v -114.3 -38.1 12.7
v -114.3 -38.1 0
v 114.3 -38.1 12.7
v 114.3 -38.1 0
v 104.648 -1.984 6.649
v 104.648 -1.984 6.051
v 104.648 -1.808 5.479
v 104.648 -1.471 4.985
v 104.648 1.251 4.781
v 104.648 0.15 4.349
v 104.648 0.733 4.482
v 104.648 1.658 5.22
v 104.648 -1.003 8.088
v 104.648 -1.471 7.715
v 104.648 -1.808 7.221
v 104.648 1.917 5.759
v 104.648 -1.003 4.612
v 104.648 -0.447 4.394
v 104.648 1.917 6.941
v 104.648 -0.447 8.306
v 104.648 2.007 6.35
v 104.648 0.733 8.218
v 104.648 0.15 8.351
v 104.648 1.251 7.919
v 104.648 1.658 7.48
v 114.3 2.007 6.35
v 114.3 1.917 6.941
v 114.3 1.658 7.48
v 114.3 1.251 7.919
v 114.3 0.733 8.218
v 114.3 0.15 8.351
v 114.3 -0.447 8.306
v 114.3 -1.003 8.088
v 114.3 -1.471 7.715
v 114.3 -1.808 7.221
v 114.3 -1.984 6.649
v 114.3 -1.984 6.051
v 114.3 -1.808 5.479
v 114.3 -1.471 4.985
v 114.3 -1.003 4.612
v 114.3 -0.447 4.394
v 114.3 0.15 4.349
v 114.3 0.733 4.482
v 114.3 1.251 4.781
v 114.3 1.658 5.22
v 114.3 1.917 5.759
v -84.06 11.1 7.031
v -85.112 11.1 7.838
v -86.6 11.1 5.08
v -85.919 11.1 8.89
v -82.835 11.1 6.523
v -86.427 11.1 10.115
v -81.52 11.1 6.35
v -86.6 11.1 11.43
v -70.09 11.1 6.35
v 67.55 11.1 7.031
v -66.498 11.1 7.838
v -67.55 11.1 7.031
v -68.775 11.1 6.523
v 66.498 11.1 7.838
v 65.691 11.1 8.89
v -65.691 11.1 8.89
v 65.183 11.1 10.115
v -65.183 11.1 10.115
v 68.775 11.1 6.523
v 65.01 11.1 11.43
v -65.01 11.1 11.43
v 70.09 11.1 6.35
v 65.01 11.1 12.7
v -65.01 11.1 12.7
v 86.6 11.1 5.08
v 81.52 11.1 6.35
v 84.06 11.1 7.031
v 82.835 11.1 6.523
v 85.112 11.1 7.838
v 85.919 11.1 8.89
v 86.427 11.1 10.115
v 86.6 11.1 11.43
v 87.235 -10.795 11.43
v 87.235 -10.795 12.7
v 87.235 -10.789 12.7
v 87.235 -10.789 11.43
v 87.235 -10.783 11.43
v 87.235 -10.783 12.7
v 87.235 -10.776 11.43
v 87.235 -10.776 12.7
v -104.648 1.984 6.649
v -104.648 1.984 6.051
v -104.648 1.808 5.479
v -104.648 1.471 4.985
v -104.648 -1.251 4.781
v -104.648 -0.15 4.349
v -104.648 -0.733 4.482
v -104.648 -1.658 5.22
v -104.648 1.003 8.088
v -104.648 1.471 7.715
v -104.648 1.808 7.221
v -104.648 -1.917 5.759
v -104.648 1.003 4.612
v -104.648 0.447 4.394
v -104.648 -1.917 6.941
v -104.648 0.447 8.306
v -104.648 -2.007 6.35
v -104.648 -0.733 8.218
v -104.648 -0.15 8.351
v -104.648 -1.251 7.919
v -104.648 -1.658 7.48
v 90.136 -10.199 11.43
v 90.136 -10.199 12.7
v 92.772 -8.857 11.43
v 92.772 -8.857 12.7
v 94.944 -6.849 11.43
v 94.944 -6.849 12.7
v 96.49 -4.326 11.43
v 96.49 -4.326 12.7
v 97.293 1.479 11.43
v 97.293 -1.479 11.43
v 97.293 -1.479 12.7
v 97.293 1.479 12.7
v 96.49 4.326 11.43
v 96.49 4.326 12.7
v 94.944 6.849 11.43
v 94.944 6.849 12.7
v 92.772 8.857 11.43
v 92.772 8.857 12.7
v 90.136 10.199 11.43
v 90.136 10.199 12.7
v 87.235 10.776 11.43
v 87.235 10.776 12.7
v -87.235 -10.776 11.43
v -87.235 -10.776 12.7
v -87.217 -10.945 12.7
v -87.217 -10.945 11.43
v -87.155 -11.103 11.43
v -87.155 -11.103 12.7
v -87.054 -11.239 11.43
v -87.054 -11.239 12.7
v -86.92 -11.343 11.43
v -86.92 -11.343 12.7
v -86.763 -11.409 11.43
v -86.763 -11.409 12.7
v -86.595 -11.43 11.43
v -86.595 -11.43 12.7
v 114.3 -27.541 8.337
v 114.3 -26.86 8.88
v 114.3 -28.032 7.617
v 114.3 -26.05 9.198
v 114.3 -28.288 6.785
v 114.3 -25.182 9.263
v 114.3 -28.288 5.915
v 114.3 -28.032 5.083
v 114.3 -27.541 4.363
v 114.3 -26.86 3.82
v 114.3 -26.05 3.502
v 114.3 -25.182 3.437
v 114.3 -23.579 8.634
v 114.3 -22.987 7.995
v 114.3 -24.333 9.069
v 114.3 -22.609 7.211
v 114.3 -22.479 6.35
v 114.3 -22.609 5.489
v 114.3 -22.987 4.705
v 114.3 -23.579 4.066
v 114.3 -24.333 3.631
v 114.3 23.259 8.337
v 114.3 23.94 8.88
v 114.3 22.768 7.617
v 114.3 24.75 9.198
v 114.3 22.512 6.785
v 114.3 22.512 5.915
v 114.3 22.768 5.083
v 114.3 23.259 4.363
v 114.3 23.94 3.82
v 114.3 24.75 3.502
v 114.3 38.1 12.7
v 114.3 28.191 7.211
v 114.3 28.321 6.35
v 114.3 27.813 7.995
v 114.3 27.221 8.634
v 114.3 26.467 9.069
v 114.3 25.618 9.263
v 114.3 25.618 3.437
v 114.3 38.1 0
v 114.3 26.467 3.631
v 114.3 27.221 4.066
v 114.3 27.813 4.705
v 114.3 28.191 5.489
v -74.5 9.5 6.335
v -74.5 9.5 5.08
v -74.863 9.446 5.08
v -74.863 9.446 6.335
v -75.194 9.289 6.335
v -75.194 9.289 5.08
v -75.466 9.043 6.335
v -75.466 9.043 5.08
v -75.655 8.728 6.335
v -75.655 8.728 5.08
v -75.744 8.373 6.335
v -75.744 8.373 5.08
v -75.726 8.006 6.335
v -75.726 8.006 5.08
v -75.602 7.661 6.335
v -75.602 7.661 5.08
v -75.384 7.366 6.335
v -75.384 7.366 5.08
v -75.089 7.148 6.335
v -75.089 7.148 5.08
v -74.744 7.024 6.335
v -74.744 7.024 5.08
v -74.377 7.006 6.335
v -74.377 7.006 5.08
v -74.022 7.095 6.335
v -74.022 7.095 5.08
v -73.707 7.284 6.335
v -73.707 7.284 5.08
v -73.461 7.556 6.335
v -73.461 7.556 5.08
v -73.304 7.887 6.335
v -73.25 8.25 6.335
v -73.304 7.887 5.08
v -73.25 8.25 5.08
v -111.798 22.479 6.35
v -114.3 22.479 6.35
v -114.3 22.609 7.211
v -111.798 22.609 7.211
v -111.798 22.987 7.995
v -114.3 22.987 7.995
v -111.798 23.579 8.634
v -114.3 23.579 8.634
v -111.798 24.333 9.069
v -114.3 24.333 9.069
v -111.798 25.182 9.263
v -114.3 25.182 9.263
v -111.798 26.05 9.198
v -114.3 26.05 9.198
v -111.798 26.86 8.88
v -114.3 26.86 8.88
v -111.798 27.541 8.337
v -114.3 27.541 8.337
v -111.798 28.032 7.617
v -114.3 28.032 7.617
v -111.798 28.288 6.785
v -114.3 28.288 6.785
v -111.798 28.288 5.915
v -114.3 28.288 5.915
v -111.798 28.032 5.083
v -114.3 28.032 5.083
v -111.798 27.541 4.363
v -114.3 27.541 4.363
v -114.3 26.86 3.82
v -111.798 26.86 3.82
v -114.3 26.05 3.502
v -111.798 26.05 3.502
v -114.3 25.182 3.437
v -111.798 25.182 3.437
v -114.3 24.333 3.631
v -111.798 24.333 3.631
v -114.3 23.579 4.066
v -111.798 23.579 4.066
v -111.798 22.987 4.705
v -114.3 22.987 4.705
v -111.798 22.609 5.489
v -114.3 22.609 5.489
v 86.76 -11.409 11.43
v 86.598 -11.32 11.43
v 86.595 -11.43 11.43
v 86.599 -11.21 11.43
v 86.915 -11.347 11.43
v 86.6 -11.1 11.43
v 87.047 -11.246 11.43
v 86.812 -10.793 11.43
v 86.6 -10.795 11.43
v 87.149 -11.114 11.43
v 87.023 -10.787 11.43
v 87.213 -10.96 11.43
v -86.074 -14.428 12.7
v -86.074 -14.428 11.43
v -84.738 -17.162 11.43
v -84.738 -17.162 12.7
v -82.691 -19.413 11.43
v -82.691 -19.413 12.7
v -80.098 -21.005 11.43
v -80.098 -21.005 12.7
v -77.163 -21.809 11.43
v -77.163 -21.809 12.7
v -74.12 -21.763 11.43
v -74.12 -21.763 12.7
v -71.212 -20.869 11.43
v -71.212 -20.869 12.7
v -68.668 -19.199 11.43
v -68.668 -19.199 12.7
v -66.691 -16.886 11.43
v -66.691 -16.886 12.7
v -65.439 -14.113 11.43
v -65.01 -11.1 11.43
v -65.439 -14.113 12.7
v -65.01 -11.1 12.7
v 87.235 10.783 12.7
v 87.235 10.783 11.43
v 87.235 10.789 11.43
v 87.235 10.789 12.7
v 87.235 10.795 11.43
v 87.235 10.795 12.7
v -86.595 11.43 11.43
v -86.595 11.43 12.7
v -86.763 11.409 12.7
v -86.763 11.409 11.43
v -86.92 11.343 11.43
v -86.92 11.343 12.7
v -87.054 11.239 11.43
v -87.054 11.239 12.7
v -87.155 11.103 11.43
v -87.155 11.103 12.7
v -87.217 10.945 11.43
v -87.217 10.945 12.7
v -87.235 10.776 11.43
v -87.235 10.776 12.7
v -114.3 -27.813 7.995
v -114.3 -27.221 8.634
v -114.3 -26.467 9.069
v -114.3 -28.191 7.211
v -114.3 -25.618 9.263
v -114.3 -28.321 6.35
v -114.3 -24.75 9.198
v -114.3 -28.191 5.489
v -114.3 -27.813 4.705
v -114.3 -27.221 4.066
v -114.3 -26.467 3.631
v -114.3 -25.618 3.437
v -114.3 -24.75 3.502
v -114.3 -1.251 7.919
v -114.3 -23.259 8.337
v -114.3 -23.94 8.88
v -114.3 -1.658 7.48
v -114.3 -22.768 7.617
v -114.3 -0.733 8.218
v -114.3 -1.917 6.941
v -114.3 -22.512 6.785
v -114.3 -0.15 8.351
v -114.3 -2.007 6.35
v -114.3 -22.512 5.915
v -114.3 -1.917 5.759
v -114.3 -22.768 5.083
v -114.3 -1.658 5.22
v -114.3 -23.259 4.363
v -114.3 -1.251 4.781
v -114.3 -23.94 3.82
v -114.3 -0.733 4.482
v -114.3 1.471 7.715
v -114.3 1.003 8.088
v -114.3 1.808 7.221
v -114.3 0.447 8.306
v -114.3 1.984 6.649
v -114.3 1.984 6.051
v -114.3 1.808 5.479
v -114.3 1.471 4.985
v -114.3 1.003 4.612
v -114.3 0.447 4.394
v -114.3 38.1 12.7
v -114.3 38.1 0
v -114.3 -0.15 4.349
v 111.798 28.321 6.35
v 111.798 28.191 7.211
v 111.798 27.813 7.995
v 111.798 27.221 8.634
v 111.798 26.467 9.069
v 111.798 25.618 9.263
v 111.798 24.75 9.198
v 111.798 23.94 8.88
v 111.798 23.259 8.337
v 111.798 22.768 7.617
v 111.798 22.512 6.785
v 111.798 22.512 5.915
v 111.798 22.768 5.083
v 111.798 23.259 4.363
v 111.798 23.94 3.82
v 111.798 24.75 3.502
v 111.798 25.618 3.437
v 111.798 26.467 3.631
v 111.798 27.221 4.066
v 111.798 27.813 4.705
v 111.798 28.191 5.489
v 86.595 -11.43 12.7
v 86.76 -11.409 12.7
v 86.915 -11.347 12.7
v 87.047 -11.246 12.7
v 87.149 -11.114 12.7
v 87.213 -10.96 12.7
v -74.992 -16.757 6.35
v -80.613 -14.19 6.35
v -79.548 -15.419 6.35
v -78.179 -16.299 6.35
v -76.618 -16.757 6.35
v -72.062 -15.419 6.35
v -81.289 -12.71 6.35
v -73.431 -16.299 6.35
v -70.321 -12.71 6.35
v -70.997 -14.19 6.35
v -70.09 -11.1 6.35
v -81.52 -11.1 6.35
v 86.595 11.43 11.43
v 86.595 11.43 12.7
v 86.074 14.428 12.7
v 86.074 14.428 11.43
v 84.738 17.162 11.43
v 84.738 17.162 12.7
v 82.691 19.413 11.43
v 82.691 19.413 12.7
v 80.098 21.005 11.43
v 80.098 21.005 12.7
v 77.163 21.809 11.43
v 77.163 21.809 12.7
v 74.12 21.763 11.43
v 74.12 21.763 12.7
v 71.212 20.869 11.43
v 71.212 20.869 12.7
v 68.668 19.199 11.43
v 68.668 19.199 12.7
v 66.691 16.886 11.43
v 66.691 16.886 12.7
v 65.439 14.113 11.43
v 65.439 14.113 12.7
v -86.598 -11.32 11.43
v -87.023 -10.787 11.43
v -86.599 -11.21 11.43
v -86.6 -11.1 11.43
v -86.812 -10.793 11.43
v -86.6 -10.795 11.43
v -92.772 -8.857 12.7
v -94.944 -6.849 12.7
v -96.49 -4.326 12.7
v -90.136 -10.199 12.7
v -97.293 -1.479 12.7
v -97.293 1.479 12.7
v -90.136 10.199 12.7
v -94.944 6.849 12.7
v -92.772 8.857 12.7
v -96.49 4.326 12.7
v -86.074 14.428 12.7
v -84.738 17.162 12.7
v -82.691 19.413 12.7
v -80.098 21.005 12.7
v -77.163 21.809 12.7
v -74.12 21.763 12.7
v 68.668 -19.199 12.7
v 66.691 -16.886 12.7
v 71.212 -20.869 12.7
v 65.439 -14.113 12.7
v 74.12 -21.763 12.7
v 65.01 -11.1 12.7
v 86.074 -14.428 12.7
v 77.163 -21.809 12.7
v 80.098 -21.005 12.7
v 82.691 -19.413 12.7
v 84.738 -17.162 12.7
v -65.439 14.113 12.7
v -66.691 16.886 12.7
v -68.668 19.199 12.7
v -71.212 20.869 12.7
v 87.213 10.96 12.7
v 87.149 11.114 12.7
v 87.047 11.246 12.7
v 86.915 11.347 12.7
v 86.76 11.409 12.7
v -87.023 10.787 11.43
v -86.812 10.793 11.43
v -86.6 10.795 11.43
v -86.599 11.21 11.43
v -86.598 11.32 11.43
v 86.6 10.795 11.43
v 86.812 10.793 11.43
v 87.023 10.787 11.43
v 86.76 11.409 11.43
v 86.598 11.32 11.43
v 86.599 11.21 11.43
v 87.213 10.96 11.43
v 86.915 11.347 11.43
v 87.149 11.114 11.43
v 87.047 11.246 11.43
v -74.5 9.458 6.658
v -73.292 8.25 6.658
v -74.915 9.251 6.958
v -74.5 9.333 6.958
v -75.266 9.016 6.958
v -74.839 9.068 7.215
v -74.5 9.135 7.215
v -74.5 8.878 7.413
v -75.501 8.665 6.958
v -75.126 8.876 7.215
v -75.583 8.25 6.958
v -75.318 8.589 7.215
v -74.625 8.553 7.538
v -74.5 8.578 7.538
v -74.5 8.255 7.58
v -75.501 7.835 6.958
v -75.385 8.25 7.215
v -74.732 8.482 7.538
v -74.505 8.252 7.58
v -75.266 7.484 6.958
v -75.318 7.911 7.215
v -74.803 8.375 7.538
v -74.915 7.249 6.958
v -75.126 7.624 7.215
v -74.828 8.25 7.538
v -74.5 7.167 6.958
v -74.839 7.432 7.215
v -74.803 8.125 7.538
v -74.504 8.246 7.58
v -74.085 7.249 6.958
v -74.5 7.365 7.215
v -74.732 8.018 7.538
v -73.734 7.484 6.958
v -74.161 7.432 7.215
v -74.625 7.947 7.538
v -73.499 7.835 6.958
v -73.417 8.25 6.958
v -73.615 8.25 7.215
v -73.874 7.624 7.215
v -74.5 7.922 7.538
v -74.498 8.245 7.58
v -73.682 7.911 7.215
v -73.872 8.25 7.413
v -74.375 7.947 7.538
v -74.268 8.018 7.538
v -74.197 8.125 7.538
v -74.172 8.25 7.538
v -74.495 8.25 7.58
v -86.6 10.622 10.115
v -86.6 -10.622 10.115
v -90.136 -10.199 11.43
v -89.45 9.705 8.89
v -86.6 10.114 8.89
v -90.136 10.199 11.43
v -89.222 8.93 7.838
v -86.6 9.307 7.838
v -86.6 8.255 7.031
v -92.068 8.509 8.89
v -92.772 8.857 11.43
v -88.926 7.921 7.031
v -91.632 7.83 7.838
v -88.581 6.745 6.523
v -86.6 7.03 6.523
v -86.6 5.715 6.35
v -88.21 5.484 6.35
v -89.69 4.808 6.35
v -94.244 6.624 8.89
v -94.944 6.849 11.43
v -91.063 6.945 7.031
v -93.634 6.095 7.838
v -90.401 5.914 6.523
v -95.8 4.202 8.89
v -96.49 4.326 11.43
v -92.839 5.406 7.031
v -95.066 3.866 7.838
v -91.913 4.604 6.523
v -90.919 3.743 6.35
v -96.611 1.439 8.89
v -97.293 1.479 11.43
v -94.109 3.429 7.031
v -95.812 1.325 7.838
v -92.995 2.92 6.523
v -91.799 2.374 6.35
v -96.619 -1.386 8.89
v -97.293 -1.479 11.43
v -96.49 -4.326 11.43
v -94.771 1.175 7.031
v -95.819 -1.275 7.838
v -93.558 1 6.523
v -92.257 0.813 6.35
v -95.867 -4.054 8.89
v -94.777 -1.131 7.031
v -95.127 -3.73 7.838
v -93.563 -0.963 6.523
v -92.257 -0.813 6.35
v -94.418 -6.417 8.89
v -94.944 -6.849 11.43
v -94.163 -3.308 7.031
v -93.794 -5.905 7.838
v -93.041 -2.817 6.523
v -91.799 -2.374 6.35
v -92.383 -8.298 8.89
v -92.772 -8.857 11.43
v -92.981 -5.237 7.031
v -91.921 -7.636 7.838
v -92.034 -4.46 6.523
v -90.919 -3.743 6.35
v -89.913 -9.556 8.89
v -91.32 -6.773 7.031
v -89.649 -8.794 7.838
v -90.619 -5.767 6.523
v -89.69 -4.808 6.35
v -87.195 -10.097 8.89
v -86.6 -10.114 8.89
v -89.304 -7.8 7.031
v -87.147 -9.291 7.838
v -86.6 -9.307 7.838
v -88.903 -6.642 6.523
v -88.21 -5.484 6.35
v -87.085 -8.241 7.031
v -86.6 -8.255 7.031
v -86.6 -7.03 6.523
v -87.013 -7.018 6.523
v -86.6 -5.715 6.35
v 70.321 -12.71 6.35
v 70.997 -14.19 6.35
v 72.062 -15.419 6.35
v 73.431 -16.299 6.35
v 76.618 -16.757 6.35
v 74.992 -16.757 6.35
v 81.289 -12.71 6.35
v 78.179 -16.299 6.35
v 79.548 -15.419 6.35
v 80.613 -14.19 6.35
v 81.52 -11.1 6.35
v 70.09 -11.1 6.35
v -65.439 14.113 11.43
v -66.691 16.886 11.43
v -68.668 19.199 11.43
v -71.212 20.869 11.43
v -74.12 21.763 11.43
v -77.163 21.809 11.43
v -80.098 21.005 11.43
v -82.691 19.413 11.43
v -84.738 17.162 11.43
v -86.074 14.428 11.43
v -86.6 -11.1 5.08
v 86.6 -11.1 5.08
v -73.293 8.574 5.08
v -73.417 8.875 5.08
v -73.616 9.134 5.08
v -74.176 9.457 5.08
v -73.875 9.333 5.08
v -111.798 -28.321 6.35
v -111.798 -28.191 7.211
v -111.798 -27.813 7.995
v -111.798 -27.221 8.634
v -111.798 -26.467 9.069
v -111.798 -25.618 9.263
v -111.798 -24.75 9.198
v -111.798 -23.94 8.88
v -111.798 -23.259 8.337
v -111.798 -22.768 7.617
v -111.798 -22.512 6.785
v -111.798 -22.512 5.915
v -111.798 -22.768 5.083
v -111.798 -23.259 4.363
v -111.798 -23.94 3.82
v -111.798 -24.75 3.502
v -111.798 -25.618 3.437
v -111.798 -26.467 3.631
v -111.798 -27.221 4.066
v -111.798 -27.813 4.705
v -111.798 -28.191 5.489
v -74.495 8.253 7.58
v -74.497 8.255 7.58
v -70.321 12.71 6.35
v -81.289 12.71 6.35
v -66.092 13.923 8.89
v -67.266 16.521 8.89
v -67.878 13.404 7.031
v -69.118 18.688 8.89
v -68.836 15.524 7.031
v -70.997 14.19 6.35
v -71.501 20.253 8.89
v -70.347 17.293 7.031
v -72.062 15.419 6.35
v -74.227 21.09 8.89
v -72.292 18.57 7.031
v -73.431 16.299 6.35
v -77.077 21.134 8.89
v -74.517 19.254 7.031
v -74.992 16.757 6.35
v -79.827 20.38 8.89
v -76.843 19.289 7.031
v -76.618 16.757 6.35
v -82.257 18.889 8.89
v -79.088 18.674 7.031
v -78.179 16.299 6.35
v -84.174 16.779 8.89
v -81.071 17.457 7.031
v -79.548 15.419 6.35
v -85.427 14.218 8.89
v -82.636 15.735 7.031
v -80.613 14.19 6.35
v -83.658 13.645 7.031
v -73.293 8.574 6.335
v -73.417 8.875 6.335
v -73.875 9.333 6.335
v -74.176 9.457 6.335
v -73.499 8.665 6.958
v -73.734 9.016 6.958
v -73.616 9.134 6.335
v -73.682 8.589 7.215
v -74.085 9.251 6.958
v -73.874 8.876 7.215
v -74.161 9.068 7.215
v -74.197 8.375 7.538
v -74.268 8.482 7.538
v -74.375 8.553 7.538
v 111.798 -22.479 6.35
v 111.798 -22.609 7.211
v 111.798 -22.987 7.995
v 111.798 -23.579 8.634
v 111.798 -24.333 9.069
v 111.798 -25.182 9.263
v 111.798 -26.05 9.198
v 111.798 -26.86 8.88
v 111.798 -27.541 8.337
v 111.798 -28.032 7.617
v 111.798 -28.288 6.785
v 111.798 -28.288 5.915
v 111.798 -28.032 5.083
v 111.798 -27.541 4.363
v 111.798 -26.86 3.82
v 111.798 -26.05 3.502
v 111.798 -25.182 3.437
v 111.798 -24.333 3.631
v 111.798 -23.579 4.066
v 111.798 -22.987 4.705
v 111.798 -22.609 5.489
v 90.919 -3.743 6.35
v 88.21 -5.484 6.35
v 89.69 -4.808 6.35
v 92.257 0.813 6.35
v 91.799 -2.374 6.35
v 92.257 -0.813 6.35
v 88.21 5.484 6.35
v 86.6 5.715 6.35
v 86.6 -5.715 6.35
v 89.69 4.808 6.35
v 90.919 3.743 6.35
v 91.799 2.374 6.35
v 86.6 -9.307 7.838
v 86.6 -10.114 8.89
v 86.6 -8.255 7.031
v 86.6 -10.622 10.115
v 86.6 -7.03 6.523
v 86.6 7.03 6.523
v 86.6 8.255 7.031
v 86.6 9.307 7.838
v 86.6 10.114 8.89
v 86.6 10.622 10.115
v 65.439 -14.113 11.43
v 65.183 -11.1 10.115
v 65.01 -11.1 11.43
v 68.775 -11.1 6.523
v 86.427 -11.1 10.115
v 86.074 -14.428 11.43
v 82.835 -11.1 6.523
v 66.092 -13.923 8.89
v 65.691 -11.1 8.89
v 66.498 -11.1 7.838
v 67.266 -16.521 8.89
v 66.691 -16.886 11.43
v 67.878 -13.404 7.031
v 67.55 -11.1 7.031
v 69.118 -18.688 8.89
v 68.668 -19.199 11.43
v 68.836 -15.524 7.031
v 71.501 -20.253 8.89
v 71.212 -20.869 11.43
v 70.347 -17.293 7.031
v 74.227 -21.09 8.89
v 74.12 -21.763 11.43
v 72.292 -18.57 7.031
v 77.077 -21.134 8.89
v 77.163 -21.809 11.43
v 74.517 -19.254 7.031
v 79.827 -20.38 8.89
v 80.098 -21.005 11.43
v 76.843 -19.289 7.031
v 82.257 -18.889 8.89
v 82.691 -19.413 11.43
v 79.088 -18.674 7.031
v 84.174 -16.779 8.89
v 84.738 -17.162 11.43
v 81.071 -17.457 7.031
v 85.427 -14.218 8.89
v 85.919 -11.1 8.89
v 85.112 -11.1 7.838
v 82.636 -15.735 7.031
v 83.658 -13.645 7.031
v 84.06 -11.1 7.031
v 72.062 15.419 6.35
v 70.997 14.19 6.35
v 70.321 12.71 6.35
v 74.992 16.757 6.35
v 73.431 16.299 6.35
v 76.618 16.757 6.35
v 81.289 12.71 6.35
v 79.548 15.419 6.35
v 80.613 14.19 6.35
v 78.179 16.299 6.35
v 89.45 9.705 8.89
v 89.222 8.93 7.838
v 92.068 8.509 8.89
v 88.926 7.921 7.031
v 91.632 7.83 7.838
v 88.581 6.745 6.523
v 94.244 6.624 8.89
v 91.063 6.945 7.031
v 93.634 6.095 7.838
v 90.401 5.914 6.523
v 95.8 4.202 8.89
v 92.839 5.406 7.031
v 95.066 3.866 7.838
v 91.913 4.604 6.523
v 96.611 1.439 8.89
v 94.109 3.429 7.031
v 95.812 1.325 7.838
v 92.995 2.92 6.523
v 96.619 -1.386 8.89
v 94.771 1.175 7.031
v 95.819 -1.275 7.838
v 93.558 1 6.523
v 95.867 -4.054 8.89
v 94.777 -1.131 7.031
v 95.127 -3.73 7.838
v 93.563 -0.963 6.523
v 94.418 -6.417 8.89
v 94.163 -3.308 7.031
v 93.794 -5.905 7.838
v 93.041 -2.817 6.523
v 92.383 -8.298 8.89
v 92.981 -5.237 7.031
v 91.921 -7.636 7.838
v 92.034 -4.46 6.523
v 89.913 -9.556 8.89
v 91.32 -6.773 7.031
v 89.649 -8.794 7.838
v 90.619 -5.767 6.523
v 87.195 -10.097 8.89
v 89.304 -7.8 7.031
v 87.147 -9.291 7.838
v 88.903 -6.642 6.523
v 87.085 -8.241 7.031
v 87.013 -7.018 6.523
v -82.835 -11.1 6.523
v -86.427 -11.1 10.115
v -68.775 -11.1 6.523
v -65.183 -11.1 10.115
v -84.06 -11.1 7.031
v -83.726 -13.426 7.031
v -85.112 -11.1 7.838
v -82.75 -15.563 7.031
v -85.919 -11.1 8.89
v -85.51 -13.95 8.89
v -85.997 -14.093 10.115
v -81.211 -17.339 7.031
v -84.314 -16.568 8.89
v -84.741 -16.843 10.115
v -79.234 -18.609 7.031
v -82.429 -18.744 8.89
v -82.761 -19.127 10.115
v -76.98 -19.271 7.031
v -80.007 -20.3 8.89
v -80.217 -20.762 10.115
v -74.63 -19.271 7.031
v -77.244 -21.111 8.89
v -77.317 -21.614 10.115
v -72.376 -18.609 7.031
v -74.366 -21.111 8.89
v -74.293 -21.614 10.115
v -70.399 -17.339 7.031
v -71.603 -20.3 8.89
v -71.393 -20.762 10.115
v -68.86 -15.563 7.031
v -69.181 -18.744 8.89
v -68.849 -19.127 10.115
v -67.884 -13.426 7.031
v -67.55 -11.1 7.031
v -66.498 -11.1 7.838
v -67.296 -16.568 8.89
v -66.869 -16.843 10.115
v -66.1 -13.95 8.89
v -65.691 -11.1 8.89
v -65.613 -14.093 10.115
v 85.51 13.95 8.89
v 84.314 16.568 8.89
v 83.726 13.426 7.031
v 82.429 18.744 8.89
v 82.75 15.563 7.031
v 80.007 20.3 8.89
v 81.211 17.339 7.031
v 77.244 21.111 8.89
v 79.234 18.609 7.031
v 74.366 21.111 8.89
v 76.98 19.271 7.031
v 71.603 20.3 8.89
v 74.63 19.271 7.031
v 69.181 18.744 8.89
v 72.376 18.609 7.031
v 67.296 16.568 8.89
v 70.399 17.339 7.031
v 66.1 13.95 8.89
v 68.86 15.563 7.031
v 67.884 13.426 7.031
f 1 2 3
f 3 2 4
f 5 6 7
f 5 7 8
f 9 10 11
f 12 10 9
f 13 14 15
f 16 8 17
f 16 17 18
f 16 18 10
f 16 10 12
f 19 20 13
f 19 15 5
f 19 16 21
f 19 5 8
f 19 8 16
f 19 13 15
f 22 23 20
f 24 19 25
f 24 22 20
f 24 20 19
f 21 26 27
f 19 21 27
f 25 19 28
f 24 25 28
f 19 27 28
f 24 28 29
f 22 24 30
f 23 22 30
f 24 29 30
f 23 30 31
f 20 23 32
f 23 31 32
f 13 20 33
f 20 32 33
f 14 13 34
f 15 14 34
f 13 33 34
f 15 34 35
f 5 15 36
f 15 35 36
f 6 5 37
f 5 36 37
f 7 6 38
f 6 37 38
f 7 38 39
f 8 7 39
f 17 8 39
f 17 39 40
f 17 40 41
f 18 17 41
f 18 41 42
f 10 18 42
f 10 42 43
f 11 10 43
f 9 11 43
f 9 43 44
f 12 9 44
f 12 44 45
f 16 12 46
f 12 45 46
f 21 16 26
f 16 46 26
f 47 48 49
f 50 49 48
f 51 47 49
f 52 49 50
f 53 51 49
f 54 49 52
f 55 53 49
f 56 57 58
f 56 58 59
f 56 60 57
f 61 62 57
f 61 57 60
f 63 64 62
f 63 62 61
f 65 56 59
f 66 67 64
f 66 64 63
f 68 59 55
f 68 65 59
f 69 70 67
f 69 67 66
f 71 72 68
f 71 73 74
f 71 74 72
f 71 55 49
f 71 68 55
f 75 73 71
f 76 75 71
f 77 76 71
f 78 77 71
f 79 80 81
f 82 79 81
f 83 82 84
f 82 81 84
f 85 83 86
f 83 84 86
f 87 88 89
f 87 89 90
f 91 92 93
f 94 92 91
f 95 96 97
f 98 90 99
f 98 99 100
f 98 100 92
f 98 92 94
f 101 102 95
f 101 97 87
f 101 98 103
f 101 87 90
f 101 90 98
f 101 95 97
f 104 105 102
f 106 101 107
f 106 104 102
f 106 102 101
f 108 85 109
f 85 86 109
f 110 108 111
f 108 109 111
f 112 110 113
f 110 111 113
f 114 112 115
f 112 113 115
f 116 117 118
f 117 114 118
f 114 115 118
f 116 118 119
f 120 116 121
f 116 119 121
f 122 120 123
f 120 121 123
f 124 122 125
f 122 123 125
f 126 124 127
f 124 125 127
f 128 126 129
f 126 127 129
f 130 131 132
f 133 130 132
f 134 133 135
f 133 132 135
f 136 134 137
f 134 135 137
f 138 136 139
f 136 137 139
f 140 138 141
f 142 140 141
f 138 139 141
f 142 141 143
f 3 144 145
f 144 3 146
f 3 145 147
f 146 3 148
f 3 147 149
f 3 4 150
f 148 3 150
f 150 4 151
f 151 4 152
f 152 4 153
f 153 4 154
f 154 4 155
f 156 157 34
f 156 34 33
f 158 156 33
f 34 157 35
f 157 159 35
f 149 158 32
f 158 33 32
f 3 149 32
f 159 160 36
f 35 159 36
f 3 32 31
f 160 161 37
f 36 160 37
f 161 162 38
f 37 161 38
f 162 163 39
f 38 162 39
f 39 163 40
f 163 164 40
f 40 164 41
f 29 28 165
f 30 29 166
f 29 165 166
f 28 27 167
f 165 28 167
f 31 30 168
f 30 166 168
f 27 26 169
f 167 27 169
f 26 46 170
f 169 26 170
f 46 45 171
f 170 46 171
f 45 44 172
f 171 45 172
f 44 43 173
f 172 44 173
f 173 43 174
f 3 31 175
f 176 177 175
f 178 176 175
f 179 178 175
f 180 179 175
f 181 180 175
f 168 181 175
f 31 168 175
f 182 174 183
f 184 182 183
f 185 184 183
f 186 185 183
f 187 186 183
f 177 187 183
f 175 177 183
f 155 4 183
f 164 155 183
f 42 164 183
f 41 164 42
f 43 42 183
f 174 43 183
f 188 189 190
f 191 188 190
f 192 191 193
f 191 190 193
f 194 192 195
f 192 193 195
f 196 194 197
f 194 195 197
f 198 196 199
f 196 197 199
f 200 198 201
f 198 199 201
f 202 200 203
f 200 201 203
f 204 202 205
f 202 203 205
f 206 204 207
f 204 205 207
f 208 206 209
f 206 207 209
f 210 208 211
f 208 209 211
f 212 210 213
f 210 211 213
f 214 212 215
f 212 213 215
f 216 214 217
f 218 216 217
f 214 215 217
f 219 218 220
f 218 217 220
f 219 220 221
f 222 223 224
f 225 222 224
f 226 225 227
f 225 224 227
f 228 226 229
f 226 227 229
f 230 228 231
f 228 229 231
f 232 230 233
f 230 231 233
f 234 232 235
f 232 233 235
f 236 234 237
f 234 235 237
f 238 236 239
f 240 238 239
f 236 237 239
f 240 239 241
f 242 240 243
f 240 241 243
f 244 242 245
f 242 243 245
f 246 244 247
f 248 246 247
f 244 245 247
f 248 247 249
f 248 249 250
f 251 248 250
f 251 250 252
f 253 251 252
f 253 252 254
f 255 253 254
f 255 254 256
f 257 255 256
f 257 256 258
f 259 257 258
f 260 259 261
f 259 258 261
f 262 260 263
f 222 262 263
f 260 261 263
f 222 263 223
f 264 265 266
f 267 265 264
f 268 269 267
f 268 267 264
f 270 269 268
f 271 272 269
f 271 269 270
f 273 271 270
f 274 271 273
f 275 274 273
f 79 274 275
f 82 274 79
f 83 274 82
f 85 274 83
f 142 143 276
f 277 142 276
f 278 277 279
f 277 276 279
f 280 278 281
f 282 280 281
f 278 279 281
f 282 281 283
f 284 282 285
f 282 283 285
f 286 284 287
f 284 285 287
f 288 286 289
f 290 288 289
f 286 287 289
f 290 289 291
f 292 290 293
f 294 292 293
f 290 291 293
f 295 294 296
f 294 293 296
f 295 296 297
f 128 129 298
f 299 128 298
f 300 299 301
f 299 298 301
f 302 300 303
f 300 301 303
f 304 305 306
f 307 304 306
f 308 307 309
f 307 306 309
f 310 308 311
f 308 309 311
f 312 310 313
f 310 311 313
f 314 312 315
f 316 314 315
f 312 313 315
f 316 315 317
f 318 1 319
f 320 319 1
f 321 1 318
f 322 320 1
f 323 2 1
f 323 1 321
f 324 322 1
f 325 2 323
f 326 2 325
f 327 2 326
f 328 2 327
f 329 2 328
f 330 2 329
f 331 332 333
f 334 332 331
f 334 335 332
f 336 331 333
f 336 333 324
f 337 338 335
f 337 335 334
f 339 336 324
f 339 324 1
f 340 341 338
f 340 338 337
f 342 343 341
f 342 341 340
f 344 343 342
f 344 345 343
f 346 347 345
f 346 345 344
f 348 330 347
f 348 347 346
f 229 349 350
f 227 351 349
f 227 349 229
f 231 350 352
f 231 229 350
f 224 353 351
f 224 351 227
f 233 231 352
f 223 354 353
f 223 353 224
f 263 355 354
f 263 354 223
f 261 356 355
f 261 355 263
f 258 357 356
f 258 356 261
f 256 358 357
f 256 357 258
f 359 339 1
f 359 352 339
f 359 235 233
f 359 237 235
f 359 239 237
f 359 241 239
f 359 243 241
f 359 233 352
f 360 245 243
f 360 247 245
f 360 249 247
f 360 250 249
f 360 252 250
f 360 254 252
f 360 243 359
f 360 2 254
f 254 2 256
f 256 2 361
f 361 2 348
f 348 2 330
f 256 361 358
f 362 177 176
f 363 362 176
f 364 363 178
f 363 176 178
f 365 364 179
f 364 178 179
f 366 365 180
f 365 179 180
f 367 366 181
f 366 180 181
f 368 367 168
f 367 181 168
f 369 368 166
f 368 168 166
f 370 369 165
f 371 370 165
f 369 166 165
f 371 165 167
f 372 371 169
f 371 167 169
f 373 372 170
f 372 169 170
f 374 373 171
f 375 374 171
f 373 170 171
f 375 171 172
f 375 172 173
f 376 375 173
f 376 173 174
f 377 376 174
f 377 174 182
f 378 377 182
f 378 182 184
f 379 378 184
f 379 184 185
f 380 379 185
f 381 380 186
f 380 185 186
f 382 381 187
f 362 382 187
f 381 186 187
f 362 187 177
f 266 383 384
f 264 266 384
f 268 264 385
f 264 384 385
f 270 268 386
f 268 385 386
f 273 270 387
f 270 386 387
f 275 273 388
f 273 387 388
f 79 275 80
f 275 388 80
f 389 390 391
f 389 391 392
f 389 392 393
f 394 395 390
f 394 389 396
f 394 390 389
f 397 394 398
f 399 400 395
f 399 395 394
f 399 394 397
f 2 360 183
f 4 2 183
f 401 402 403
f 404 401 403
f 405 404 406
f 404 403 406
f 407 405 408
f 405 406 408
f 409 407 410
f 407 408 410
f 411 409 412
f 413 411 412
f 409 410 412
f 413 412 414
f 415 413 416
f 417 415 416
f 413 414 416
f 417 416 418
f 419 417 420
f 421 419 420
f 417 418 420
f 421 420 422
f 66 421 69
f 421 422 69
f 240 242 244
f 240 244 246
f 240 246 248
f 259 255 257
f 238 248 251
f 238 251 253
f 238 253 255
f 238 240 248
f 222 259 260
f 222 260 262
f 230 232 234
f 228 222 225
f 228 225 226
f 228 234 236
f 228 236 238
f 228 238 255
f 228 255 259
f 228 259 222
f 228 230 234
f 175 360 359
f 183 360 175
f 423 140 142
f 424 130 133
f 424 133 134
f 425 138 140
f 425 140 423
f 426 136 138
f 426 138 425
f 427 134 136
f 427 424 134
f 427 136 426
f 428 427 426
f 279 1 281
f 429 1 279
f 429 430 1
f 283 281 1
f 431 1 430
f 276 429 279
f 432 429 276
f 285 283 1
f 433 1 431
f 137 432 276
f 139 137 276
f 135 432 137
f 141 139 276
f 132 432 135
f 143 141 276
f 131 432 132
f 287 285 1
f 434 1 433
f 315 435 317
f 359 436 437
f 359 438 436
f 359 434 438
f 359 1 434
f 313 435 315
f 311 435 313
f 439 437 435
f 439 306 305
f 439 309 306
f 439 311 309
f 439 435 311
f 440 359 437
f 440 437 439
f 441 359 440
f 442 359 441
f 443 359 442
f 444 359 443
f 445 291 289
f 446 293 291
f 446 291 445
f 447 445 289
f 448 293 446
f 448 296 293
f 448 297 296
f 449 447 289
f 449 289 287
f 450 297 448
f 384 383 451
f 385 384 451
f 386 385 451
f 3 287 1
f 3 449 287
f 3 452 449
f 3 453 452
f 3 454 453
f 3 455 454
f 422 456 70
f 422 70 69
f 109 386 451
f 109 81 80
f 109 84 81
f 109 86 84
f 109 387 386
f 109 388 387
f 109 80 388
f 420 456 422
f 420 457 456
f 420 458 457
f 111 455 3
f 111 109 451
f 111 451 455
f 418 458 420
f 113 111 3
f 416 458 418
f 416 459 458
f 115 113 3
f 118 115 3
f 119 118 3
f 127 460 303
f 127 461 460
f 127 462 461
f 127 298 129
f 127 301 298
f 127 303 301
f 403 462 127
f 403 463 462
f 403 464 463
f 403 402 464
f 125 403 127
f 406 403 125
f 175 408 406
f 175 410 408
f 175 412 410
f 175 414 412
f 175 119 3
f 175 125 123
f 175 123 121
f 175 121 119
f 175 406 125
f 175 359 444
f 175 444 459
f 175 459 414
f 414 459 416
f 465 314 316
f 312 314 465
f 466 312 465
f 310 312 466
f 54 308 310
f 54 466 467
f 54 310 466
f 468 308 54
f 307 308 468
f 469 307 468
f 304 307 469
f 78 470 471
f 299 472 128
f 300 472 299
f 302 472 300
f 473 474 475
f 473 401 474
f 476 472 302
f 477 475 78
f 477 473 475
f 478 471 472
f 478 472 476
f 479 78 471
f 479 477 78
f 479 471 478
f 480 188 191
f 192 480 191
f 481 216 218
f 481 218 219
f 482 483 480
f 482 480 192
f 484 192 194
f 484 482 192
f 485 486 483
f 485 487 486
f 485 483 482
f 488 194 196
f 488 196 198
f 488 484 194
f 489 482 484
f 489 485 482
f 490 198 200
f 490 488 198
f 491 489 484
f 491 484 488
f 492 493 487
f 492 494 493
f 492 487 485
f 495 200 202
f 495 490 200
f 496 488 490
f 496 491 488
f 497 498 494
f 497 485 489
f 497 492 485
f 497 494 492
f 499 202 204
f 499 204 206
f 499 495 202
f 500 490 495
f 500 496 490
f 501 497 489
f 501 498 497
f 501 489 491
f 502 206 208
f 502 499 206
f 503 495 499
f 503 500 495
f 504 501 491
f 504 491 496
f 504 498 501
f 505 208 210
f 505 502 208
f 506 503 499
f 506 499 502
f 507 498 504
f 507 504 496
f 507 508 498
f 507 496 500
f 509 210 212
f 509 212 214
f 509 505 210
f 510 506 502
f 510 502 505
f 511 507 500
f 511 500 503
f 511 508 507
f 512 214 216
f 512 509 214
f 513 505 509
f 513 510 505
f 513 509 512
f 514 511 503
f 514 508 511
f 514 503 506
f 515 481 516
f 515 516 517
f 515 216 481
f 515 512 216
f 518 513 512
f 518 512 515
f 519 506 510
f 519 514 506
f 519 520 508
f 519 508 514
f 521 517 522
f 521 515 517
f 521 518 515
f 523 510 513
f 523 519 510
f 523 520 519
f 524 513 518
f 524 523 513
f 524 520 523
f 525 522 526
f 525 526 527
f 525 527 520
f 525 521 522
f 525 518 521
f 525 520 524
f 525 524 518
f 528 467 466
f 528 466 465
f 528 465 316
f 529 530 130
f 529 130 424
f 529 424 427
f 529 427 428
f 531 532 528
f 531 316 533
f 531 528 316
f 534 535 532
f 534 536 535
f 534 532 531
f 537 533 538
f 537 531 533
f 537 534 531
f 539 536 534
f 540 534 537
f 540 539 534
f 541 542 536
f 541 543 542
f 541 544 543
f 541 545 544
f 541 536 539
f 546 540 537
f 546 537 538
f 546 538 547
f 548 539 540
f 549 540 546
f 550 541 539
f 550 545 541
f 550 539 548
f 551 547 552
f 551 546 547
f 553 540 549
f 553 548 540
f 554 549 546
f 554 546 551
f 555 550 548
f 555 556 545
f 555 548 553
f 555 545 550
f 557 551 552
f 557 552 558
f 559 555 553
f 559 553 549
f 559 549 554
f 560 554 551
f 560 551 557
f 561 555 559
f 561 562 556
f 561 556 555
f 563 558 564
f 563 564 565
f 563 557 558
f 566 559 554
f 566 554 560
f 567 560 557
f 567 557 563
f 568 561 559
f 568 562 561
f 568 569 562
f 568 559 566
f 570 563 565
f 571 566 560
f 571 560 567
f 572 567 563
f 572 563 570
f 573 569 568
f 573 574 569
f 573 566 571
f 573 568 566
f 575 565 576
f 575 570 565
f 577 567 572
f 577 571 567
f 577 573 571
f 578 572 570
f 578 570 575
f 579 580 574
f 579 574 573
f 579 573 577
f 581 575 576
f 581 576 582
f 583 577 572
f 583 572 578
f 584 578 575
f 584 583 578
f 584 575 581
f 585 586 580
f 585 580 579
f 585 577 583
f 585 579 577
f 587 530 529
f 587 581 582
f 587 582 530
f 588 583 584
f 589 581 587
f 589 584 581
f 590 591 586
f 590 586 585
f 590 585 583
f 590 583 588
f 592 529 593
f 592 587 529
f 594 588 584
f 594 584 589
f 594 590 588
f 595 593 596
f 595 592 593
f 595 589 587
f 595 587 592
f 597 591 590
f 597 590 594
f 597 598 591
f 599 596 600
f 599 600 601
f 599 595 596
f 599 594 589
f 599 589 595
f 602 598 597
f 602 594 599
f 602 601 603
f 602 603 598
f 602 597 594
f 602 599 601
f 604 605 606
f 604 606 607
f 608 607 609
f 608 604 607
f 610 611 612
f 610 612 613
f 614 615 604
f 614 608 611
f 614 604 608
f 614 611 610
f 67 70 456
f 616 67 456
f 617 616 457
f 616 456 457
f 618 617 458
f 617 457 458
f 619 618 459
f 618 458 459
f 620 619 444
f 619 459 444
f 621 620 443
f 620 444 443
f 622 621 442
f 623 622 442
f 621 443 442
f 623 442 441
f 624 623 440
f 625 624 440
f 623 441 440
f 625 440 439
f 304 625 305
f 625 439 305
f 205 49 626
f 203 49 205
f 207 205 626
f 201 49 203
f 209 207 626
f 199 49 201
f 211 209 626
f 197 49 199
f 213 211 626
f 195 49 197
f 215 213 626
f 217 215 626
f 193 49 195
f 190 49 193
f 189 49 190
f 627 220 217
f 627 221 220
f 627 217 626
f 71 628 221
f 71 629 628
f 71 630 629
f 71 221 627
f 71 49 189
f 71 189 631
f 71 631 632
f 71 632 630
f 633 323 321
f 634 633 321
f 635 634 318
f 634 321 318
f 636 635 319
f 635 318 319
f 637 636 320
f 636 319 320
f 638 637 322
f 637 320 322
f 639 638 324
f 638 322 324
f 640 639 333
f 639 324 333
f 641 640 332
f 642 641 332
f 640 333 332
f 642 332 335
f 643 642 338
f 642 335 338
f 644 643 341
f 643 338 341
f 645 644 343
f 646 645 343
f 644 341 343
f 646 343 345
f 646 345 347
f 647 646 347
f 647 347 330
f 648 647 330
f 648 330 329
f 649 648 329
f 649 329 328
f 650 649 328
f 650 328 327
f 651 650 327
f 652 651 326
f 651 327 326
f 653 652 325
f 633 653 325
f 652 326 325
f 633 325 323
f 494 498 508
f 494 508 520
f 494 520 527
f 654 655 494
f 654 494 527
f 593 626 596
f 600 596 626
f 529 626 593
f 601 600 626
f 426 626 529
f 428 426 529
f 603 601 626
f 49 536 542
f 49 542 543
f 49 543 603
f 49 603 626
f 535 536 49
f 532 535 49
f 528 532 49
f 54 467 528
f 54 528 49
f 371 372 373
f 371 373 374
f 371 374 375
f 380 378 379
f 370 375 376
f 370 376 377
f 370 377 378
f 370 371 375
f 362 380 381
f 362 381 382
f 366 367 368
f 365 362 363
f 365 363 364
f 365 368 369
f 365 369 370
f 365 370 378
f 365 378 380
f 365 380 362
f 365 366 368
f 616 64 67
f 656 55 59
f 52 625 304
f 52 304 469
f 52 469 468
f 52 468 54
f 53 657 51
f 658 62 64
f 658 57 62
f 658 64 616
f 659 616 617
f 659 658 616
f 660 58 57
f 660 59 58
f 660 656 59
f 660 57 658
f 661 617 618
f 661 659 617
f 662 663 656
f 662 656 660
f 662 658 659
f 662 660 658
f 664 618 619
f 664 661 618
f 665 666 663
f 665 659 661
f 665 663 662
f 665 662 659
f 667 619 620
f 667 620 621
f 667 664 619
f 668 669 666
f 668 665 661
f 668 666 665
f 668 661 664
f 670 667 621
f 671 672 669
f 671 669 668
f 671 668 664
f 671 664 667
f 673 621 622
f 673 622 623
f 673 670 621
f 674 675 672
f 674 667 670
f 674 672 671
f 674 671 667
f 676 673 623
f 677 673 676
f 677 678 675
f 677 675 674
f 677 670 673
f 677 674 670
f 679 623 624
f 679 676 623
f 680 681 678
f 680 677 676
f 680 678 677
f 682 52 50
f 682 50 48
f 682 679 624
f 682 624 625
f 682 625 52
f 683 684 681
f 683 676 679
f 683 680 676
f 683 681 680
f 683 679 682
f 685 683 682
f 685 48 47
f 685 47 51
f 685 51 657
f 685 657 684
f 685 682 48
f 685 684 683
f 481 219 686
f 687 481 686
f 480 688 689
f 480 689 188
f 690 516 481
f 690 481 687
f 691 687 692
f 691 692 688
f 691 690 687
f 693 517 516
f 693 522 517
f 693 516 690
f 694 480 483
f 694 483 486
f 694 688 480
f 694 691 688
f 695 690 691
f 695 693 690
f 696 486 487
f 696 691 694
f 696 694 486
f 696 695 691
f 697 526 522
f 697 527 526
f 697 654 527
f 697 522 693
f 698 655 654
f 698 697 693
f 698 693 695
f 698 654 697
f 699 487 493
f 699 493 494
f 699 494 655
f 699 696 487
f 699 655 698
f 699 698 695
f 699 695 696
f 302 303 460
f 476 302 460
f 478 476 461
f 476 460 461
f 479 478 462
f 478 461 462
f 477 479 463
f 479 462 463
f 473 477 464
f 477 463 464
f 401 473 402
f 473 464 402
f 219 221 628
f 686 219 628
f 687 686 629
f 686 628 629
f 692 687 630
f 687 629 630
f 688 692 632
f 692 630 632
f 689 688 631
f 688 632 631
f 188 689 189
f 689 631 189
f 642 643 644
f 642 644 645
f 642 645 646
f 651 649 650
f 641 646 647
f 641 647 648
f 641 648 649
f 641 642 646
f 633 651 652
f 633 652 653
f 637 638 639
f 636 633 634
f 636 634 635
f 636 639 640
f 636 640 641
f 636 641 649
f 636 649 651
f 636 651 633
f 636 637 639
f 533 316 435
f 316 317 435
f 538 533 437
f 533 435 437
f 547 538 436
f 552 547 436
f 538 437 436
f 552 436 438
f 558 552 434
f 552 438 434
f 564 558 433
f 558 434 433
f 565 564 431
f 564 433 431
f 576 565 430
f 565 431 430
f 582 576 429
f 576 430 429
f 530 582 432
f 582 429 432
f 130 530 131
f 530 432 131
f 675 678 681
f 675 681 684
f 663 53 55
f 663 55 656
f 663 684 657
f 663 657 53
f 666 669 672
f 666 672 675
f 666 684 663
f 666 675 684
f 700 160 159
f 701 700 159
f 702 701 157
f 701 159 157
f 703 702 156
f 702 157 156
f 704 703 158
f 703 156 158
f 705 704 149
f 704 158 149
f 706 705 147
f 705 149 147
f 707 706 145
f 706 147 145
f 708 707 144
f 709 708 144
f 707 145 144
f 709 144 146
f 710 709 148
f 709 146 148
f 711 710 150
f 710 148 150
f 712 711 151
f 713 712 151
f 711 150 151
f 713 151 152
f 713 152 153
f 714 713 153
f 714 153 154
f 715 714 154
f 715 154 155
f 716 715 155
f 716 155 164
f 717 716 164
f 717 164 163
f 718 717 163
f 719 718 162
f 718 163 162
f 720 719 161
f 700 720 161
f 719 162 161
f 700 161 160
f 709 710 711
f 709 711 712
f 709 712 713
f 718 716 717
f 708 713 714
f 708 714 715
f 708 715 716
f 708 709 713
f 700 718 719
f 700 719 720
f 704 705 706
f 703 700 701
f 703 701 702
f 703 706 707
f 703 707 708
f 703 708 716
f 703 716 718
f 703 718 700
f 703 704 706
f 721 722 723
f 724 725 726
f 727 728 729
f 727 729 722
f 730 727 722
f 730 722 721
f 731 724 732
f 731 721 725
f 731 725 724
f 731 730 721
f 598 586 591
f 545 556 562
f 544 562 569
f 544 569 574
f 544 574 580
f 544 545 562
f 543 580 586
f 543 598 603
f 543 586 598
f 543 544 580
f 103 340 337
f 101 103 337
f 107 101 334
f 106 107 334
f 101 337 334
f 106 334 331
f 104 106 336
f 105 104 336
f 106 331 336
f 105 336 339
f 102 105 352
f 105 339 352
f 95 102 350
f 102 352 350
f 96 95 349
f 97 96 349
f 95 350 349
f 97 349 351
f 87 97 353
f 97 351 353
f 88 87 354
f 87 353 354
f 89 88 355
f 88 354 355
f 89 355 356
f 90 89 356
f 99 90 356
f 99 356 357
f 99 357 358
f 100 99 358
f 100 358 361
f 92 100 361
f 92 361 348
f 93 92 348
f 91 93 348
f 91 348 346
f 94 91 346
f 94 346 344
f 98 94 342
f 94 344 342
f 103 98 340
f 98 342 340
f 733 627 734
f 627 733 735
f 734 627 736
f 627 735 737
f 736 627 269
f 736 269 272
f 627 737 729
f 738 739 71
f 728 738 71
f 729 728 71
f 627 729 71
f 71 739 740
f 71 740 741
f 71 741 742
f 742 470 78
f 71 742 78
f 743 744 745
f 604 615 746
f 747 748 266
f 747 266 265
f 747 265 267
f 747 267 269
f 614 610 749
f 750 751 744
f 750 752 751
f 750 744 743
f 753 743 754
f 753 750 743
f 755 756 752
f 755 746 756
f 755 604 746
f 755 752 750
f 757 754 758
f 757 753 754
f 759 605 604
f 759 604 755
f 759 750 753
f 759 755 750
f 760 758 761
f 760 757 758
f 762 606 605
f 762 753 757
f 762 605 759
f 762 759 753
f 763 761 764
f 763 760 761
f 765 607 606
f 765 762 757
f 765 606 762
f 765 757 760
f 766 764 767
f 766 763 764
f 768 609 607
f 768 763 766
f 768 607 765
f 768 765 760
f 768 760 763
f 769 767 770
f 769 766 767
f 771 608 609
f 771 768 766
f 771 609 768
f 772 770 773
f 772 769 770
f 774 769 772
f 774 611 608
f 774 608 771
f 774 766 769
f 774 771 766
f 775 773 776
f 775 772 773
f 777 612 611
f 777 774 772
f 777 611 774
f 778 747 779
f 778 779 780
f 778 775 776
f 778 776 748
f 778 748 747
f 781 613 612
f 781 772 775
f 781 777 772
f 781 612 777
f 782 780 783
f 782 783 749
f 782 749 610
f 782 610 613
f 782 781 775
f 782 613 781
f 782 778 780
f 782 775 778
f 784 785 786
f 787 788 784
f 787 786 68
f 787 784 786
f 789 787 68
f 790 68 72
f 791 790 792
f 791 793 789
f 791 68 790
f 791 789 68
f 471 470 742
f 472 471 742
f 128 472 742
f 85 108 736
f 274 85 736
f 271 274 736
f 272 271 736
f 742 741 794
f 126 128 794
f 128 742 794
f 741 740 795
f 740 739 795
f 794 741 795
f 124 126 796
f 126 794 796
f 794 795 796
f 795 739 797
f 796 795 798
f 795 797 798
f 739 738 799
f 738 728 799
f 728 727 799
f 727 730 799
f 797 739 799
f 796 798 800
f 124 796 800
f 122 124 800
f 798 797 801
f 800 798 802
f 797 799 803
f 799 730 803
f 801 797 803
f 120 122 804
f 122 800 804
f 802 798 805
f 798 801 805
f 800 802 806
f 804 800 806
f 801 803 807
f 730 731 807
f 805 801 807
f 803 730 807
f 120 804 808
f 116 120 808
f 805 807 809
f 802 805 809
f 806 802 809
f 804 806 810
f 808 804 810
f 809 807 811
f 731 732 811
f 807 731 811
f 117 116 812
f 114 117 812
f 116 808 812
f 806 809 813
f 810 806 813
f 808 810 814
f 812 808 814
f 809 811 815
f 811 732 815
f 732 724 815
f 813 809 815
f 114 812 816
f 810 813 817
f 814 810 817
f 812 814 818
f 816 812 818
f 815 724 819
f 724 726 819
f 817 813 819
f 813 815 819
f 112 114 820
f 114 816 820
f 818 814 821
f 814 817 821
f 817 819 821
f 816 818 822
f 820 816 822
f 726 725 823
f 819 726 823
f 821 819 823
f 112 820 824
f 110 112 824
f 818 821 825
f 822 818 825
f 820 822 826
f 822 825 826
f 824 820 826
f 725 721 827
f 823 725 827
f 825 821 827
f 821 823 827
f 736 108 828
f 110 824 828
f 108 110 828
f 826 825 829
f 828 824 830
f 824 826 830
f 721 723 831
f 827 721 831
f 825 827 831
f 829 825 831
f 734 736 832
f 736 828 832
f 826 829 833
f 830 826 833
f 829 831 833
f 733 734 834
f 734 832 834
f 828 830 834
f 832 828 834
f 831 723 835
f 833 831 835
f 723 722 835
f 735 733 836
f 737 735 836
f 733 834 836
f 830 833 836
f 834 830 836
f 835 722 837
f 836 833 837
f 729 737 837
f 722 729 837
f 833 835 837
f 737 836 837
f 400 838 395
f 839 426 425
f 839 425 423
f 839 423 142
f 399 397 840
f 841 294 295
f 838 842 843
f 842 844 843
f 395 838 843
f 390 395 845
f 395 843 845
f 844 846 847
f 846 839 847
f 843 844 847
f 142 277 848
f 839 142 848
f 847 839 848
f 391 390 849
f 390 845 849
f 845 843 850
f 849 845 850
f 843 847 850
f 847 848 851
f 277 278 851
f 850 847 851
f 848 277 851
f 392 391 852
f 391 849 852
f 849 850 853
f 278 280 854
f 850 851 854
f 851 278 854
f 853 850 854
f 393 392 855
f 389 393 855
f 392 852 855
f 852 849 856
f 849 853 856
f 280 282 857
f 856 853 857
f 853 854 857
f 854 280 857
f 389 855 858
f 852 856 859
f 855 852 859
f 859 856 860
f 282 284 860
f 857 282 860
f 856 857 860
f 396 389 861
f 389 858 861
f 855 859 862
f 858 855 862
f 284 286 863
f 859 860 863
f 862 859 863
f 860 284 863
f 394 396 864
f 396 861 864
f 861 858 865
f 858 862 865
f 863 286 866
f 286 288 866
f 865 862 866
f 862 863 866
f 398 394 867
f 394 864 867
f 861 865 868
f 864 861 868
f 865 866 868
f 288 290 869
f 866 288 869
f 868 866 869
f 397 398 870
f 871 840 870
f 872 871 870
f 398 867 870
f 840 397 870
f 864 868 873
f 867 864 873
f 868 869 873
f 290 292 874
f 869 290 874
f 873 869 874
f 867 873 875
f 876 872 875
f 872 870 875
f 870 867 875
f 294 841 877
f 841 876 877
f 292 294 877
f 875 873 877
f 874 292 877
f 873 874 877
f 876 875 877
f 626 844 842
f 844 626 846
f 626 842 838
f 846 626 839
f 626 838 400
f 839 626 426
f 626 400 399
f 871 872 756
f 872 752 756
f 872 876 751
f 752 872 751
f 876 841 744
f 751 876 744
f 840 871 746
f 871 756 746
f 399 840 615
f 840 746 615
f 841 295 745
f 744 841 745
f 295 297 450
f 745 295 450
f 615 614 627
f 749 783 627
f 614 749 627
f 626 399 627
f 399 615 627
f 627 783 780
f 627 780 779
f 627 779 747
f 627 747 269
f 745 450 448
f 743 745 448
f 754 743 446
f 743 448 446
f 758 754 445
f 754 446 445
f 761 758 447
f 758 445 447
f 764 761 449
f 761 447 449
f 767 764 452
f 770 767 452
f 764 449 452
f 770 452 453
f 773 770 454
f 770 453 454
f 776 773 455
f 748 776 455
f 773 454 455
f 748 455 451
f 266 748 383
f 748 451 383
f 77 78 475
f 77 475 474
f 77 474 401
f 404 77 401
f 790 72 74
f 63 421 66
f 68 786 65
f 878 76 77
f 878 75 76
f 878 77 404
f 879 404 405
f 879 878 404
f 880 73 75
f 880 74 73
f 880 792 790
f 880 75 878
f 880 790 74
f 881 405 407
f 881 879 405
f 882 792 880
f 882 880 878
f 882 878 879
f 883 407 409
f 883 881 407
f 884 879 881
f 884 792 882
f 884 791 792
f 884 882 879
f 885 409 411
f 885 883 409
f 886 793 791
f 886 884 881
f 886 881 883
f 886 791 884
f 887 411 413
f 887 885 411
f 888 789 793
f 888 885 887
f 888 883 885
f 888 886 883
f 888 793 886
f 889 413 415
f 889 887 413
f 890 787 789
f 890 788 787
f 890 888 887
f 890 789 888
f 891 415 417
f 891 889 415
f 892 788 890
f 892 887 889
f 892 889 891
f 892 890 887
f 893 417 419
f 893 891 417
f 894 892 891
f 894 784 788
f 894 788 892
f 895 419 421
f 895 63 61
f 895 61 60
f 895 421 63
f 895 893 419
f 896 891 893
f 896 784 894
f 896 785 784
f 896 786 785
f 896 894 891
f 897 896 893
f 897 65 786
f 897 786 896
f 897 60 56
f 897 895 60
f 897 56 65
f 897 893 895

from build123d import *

# Parameters (mm, degrees)
F0_W      = 228.6
F0_H      = 76.2
F1_DEPTH  = 12.7
F2_W      = 173.19999904
F2_H      = 22.19999878
F3_DEPTH  = 7.62
F4_R      = 10.795
F5_DEPTH  = 6.35
F7_DEPTH  = 6.35
F8_R      = 2.0066
F9_DEPTH  = 9.652
F10_R     = 2.0066
F11_DEPTH = 9.652
F12_R     = 2.921
F13_DEPTH = 2.5019
F14_R     = 2.921
F15_DEPTH = 2.5019
F16_R     = 5.08
F18_DEPTH = 2.50000008
F19_R     = 1.2446
F21_DEPTH = 1.27


with BuildPart() as f1:
    # F0 (on Top) → F1 (new body)
    with BuildSketch(Plane.XY):
        Rectangle(F0_W, F0_H)
    extrude(amount=F1_DEPTH)

    # F2 (on face) → F3 (cut)
    with BuildSketch(Plane.XY.offset(12.7)):
        Rectangle(F2_W, F2_H)
    extrude(amount=-F3_DEPTH, mode=Mode.SUBTRACT)

    # F4 (on face) → F5 (cut)
    with BuildSketch(Plane.XY.offset(12.7)):
        with Locations((-86.59999952, 0)):
            Circle(F4_R)
        with Locations((86.59999952, 0)):
            Circle(F4_R)
    extrude(amount=-F5_DEPTH, mode=Mode.SUBTRACT)

    # F6 (on face) → F7 (cut)
    with BuildSketch(Plane.XY.offset(12.7)):
        with BuildLine():
            Line((-75.80499952, -11.09999939), (-86.59999952, -11.09999939))
            ThreePointArc((-86.59999952, -11.09999939), (-75.80499952, -21.89499939), (-65.00999952, -11.09999939))
            Line((-65.00999952, -11.09999939), (-75.80499952, -11.09999939))
        make_face()
        with BuildLine():
            ThreePointArc((86.59999952, 11.09999939), (75.80499952, 21.89499939), (65.00999952, 11.09999939))
            Line((65.00999952, 11.09999939), (75.80499952, 11.09999939))
            Line((75.80499952, 11.09999939), (86.59999952, 11.09999939))
        make_face()
        with BuildLine():
            Line((75.80499952, -11.09999939), (65.00999952, -11.09999939))
            ThreePointArc((65.00999952, -11.09999939), (75.80499952, -21.89499939), (86.59999952, -11.09999939))
            Line((86.59999952, -11.09999939), (75.80499952, -11.09999939))
        make_face()
        with BuildLine():
            ThreePointArc((-65.00999952, 11.09999939), (-75.80499952, 21.89499939), (-86.59999952, 11.09999939))
            Line((-86.59999952, 11.09999939), (-75.80499952, 11.09999939))
            Line((-75.80499952, 11.09999939), (-65.00999952, 11.09999939))
        make_face()
    extrude(amount=-F7_DEPTH, mode=Mode.SUBTRACT)

    # F8 (on face) → F9 (cut)
    with BuildSketch(Plane(origin=(-114.3, 0, 0), x_dir=(0, -1, 0), z_dir=(-1, 0, 0))):
        with Locations((0, 6.35)):
            Circle(F8_R)
    extrude(amount=-F9_DEPTH, mode=Mode.SUBTRACT)

    # F10 (on face) → F11 (cut)
    with BuildSketch(Plane.YZ.offset(114.3)):
        with Locations((0, 6.35)):
            Circle(F10_R)
    extrude(amount=-F11_DEPTH, mode=Mode.SUBTRACT)

    # F12 (on face) → F13 (cut)
    with BuildSketch(Plane(origin=(-114.3, 0, 0), x_dir=(0, -1, 0), z_dir=(-1, 0, 0))):
        with Locations((-25.4, 6.35)):
            Circle(F12_R)
        with Locations((25.4, 6.35)):
            Circle(F12_R)
    extrude(amount=-F13_DEPTH, mode=Mode.SUBTRACT)

    # F14 (on face) → F15 (cut)
    with BuildSketch(Plane.YZ.offset(114.3)):
        with Locations((-25.4, 6.35)):
            Circle(F14_R)
        with Locations((25.4, 6.35)):
            Circle(F14_R)
    extrude(amount=-F15_DEPTH, mode=Mode.SUBTRACT)

    # F16 (call 1 of 6: OpenCascade refuses the feature's edges together)
    f16_edges = [f1.edges().sort_by_distance(p)[0] for p in [
        (-97.395, 0, 6.35),
    ]]
    fillet(f16_edges, radius=F16_R)

    # F16#2 (call 2 of 6)
    f16_2_edges = [f1.edges().sort_by_distance(p)[0] for p in [
        (-75.805, 21.894999, 6.35),
    ]]
    fillet(f16_2_edges, radius=F16_R)

    # F16#3 (call 3 of 6)
    f16_3_edges = [f1.edges().sort_by_distance(p)[0] for p in [
        (-75.805, -21.894999, 6.35),
    ]]
    fillet(f16_3_edges, radius=F16_R)

    # F16#4 (call 4 of 6)
    f16_4_edges = [f1.edges().sort_by_distance(p)[0] for p in [
        (75.805, 21.894999, 6.35),
    ]]
    fillet(f16_4_edges, radius=F16_R)

    # F16#5 (call 5 of 6)
    f16_5_edges = [f1.edges().sort_by_distance(p)[0] for p in [
        (97.395, 0, 6.35),
    ]]
    fillet(f16_5_edges, radius=F16_R)

    # F16#6 (call 6 of 6)
    f16_6_edges = [f1.edges().sort_by_distance(p)[0] for p in [
        (75.805, -21.894999, 6.35),
    ]]
    fillet(f16_6_edges, radius=F16_R)

    # F17 (on face) → F18 (join)
    with BuildSketch(Plane.XY.offset(5.08)):
        with BuildLine():
            Line((-74.5000034, 8.25000001), (-74.5000034, 9.50000005))
            ThreePointArc((-74.5000034, 9.50000005), (-75.3838869048, 7.3661165052), (-73.25000336, 8.25000001))
            Line((-73.25000336, 8.25000001), (-74.5000034, 8.25000001))
        make_face()
        with BuildLine():
            ThreePointArc((-73.25000336, 8.25000001), (-73.6161198952, 9.1338835148), (-74.5000034, 9.50000005))
            Line((-74.5000034, 9.50000005), (-74.5000034, 8.25000001))
            Line((-74.5000034, 8.25000001), (-73.25000336, 8.25000001))
        make_face()
    extrude(amount=F18_DEPTH)

    # F19
    f19_edges = [f1.edges().sort_by_distance(p)[0] for p in [
        (-75.750003, 8.25, 7.58),
    ]]
    fillet(f19_edges, radius=F19_R)

    # F20 (on face) → F21 (cut)
    with BuildSketch(Plane.XY.offset(12.7)):
        with BuildLine():
            ThreePointArc((-86.59999952, 11.09999939), (-86.5987382997, 11.2650089547), (-86.5949549334, 11.429979962))
            ThreePointArc((-86.5949549334, 11.429979962), (-87.0538068899, 11.2391664903), (-87.2347248066, 10.7763235294))
            ThreePointArc((-87.2347248066, 10.7763235294), (-86.91749952, 10.7903298722), (-86.59999952, 10.795))
            Line((-86.59999952, 10.795), (-86.59999952, 11.09999939))
        make_face()
        with BuildLine():
            ThreePointArc((-86.59999952, -10.795), (-86.91749952, -10.7903298722), (-87.2347248066, -10.7763235294))
            ThreePointArc((-87.2347248066, -10.7763235294), (-87.0538068899, -11.2391664903), (-86.5949549334, -11.429979962))
            ThreePointArc((-86.5949549334, -11.429979962), (-86.5987382997, -11.2650089547), (-86.59999952, -11.09999939))
            Line((-86.59999952, -11.09999939), (-86.59999952, -10.795))
        make_face()
        with BuildLine():
            ThreePointArc((87.23499952, 10.795), (87.047225239, 11.2457928086), (86.5949549334, 11.429979962))
            ThreePointArc((86.5949549334, 11.429979962), (86.5987382997, 11.2650089547), (86.59999952, 11.09999939))
            Line((86.59999952, 11.09999939), (86.59999952, 10.795))
            ThreePointArc((86.59999952, 10.795), (86.91749952, 10.7903298722), (87.2347248066, 10.7763235294))
            ThreePointArc((87.2347248066, 10.7763235294), (87.2349308379, 10.7856607546), (87.23499952, 10.795))
        make_face()
        with BuildLine():
            ThreePointArc((87.23499952, -10.795), (87.2349308379, -10.7856607546), (87.2347248066, -10.7763235294))
            ThreePointArc((87.2347248066, -10.7763235294), (86.91749952, -10.7903298722), (86.59999952, -10.795))
            Line((86.59999952, -10.795), (86.59999952, -11.09999939))
            ThreePointArc((86.59999952, -11.09999939), (86.5987382997, -11.2650089547), (86.5949549334, -11.429979962))
            ThreePointArc((86.5949549334, -11.429979962), (87.047225239, -11.2457928086), (87.23499952, -10.795))
        make_face()
    extrude(amount=-F21_DEPTH, mode=Mode.SUBTRACT)


solid = f1.part
